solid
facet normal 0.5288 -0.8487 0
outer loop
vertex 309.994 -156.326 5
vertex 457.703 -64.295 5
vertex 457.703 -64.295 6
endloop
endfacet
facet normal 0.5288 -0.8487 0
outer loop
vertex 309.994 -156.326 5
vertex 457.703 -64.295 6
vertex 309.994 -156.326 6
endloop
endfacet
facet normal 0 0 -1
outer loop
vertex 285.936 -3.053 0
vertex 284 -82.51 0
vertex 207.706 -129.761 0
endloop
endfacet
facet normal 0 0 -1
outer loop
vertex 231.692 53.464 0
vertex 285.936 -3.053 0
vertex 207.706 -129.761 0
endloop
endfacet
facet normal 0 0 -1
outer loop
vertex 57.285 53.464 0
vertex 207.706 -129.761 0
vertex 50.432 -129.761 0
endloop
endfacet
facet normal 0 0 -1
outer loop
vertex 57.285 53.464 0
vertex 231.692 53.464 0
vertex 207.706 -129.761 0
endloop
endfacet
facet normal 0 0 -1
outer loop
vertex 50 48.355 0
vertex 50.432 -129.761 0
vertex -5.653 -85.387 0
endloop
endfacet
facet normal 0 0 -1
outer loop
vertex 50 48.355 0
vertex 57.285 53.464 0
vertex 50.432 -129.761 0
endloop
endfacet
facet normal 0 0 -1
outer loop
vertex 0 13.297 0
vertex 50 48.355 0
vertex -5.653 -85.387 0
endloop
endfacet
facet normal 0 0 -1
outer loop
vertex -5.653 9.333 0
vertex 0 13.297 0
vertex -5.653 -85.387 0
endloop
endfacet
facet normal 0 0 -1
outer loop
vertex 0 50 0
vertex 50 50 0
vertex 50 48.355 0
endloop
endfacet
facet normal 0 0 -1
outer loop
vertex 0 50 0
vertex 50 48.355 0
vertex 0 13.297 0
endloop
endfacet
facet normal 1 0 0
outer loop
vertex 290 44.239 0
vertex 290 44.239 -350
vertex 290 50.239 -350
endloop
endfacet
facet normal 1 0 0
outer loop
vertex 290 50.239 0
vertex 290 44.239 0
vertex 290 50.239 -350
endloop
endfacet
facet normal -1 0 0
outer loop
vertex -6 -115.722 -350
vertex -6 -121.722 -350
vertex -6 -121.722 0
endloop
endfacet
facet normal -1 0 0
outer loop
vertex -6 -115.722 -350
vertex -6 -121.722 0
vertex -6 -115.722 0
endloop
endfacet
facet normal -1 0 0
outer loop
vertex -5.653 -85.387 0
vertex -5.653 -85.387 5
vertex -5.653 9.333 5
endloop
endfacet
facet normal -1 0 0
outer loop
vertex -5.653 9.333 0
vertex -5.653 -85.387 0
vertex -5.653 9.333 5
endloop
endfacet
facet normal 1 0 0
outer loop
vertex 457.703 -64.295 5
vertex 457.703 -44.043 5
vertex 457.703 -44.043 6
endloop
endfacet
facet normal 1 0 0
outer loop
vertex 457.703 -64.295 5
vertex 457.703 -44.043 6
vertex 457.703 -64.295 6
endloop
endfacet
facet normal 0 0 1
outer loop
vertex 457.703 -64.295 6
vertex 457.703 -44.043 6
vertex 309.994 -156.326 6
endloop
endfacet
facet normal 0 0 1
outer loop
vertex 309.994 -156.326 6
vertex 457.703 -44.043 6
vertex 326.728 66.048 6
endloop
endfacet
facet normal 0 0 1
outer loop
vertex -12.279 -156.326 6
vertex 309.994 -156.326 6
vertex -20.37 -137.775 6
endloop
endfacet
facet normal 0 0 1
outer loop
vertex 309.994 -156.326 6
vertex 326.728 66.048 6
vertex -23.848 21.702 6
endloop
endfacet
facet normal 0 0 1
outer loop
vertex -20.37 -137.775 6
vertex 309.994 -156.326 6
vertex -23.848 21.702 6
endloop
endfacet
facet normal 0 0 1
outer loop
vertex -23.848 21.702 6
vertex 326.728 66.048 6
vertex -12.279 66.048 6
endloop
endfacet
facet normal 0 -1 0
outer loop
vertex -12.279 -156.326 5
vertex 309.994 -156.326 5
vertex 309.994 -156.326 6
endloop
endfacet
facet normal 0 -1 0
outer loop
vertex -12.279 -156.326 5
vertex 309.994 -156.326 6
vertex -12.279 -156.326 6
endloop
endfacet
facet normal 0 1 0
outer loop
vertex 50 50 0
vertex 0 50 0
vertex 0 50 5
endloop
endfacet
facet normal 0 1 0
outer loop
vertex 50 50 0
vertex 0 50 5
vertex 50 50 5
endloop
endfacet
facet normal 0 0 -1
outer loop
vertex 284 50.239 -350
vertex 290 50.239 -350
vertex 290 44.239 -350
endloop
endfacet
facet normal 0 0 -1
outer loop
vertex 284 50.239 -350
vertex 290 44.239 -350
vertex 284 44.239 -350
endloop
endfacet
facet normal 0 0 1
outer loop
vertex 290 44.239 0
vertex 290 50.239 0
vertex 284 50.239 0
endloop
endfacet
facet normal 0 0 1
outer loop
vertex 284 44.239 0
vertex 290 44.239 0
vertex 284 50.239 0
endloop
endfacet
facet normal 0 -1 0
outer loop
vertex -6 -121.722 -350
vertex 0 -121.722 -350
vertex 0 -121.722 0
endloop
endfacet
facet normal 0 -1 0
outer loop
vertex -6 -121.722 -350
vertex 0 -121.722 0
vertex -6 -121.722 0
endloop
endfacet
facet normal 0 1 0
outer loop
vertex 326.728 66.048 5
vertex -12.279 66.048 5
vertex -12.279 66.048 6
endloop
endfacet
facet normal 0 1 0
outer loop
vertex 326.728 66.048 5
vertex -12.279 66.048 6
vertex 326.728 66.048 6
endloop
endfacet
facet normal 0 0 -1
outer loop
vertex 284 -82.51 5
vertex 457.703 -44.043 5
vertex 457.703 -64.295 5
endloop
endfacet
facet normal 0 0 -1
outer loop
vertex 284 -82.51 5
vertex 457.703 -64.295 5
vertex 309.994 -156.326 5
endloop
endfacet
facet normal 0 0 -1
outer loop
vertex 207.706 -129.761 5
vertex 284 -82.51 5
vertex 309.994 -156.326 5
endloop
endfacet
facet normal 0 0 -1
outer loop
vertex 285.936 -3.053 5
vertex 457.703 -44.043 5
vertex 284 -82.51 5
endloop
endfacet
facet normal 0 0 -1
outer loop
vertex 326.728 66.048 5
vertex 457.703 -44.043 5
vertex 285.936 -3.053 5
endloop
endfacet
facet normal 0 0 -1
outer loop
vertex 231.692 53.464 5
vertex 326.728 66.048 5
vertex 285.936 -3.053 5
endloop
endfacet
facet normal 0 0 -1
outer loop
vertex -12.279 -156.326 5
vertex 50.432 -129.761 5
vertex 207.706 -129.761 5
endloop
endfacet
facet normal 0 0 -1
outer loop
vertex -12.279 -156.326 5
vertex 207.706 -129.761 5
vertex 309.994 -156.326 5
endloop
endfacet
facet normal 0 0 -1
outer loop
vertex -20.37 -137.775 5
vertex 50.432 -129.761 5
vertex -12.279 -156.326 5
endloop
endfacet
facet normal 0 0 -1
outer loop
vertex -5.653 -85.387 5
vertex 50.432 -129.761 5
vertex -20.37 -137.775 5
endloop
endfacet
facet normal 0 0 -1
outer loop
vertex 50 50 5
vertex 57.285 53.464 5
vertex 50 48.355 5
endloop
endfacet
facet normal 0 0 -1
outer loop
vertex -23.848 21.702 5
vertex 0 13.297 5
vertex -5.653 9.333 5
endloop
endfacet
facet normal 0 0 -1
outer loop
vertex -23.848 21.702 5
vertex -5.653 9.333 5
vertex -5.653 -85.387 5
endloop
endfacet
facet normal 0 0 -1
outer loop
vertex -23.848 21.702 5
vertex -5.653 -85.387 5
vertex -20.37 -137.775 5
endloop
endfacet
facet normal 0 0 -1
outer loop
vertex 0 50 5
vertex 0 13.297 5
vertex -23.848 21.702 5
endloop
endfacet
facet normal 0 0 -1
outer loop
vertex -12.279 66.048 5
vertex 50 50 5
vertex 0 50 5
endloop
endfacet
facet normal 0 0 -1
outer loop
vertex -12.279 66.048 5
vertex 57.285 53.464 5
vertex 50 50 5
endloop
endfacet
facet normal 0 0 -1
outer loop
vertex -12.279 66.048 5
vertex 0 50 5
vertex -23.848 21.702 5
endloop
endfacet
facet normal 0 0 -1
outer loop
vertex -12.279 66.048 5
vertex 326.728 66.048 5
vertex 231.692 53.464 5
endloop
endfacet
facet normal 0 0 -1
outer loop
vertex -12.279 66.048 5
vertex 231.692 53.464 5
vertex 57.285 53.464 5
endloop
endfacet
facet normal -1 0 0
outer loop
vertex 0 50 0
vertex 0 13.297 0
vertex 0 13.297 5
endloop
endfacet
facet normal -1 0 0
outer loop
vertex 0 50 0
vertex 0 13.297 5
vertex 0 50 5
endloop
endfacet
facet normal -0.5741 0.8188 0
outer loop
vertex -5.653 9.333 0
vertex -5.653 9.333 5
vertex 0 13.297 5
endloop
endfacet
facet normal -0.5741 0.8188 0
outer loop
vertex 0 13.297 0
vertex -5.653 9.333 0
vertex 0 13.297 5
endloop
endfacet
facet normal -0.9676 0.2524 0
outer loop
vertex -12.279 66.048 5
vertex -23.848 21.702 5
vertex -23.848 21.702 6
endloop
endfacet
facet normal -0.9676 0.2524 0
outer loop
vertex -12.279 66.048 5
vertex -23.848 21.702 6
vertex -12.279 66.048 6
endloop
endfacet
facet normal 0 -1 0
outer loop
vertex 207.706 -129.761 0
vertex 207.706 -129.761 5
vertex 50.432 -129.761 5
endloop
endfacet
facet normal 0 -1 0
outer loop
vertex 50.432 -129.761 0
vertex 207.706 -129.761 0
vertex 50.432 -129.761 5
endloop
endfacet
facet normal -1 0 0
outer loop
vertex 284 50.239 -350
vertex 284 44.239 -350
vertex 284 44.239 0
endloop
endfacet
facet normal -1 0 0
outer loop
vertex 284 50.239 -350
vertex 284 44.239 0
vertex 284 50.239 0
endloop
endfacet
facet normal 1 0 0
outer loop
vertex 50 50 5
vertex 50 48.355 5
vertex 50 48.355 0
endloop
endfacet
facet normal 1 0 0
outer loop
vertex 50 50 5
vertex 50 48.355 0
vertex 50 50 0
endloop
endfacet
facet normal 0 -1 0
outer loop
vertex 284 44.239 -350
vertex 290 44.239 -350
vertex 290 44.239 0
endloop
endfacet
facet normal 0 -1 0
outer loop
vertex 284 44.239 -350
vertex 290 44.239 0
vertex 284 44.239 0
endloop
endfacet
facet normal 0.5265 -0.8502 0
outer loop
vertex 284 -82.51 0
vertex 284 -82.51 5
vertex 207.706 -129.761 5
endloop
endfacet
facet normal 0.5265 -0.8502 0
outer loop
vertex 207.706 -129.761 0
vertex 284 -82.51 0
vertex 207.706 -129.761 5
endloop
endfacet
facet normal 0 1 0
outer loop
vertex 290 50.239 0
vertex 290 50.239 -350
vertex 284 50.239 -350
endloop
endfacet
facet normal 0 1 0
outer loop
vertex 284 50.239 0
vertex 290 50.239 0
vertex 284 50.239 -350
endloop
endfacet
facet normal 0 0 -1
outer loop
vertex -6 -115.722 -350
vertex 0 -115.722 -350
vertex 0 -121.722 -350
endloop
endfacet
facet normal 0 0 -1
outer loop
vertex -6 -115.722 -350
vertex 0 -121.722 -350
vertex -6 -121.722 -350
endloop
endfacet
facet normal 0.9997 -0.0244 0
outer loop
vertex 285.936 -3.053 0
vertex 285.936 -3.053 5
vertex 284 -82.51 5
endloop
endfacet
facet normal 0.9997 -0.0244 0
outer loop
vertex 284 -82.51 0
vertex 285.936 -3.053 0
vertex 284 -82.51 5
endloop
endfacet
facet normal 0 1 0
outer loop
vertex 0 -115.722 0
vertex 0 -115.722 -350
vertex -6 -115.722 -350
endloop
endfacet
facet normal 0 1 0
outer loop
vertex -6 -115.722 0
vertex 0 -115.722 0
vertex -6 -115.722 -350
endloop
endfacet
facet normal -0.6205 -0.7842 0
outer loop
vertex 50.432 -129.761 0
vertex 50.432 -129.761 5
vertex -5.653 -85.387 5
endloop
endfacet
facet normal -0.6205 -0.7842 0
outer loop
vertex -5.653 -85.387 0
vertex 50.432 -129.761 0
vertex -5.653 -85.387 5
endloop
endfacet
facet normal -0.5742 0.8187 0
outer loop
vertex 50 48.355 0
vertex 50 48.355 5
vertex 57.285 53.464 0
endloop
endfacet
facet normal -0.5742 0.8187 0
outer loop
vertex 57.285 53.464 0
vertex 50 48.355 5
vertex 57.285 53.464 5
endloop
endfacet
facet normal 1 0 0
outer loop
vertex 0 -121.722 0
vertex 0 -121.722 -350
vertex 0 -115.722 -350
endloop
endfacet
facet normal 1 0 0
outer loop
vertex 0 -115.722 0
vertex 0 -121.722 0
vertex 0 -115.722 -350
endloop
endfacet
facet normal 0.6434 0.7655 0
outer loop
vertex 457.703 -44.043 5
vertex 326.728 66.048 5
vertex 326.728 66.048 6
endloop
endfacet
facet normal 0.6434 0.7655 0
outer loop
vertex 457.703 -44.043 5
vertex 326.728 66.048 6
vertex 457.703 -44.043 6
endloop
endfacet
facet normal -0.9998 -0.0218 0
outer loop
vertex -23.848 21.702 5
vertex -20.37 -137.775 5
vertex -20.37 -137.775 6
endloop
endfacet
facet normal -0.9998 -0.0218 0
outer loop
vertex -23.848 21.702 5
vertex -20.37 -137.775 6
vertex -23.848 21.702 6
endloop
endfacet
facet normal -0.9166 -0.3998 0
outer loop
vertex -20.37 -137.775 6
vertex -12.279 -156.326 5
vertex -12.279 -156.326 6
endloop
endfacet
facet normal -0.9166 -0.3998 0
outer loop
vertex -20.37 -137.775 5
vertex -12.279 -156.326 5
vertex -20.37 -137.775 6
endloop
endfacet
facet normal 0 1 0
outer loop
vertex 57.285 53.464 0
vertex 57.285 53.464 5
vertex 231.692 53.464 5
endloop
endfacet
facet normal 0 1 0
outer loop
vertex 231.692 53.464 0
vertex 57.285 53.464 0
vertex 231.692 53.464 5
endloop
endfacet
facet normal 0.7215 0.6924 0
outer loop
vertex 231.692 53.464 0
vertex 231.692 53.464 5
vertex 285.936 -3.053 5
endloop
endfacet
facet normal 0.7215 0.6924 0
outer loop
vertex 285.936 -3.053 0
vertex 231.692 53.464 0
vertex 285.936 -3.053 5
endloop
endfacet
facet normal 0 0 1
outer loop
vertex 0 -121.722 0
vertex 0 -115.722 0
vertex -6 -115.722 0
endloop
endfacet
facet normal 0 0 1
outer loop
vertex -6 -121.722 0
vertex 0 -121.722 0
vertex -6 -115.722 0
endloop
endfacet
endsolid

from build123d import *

# Parameters (mm, degrees)
ESQUISSE1_W          = 50
ESQUISSE1_H          = 50
BOSS_EXTRU_1_DEPTH   = 5
BOSS_EXTRU_2_DEPTH   = 5
ESQUISSE3_W          = 6
ESQUISSE3_H          = 6
BOSS_EXTRU_3_DEPTH   = 350
BOSS_EXTRU_3_2_DEPTH = 350
BOSS_EXTRU_4_DEPTH   = 1


with BuildPart() as part:
    # Esquisse1 → Boss.-Extru.1 (new body)
    with BuildSketch(Plane.XY):
        with Locations((25, 25)):
            Rectangle(ESQUISSE1_W, ESQUISSE1_H)
    extrude(amount=BOSS_EXTRU_1_DEPTH)

    # Esquisse2 → Boss.-Extru.2 (add)
    with BuildSketch(Plane.XY.offset(5)):
        Polygon((-5.653453017, 9.333236963), (57.285195489, 53.463556126), (231.691551155, 53.463556126), (285.93578731, -3.052689921), (284, -82.509595771), (207.706196647, -129.761060536), (50.431516213, -129.761060536), (-5.653453017, -85.386571632), align=None)
    extrude(amount=-BOSS_EXTRU_2_DEPTH)

    # Esquisse4 → Boss.-Extru.4 (add)
    with BuildSketch(Plane.XY.offset(5)):
        Polygon((-12.279278661, 66.048069058), (326.72770214, 66.048069058), (457.703171695, -44.043166729), (457.703171695, -64.294776841), (309.993915216, -156.325656643), (-12.279278661, -156.325656643), (-20.370490615, -137.774738612), (-23.847853986, 21.701863644), align=None)
    extrude(amount=BOSS_EXTRU_4_DEPTH)


with BuildPart() as body_2:
    # Esquisse3 → Boss.-Extru.3 (new body)
    with BuildSketch(Plane(origin=(0, 0, 0), x_dir=(-1, 0, 0), z_dir=(0, 0, -1))):
        with Locations((3, -118.721693301)):
            Rectangle(ESQUISSE3_W, ESQUISSE3_H)
    extrude(amount=BOSS_EXTRU_3_DEPTH)


with BuildPart() as body_3:
    # Esquisse3 → Boss.-Extru.3 2 (new body)
    with BuildSketch(Plane(origin=(0, 0, 0), x_dir=(-1, 0, 0), z_dir=(0, 0, -1))):
        with Locations((-287, 47.238939464)):
            Rectangle(ESQUISSE3_W, ESQUISSE3_H)
    extrude(amount=BOSS_EXTRU_3_2_DEPTH)


solid = Compound([part.part, body_2.part, body_3.part])
